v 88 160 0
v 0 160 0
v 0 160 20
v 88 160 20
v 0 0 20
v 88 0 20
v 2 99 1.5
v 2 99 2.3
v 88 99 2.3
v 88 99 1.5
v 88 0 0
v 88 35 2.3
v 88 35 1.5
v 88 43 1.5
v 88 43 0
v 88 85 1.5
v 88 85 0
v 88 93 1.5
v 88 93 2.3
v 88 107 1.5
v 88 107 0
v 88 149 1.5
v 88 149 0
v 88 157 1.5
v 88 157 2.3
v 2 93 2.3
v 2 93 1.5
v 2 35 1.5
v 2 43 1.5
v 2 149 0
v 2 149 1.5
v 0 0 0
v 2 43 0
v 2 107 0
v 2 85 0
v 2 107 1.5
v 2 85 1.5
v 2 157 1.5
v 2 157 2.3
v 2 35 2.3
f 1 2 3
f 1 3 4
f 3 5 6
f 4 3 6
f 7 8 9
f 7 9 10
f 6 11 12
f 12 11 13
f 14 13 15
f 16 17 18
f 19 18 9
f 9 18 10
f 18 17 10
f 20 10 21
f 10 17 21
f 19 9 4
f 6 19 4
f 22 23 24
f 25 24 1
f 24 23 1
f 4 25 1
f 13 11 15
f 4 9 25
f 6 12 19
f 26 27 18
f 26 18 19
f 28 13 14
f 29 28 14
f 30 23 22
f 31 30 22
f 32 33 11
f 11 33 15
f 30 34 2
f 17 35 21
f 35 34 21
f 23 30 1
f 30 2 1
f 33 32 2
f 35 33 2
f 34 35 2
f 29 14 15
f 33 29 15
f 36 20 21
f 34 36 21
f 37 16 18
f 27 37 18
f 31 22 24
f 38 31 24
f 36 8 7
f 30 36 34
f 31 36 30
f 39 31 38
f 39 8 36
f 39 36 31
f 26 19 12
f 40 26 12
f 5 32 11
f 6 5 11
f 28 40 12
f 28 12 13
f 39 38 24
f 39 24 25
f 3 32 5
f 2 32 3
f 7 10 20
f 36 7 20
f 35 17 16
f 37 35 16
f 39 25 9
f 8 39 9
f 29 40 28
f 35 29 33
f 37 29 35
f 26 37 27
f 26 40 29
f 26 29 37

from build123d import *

# Parameters (mm, degrees)
F0_W     = 88
F0_H     = 160
F1_DEPTH = 20
F3_DEPTH = 86


with BuildPart() as f1:
    # F0 (on Top) → F1 (new body)
    with BuildSketch(Plane.XY):
        with Locations((44, 80)):
            Rectangle(F0_W, F0_H)
    extrude(amount=F1_DEPTH)

    # F2 (on face) → F3 (cut)
    with BuildSketch(Plane.YZ.offset(88)):
        Polygon((107, 0), (149, 0), (149, 1.5), (157, 1.5), (157, 2.3), (99, 2.3), (99, 1.5), (107, 1.5), align=None)
        Polygon((93, 1.5), (93, 2.3), (35, 2.3), (35, 1.5), (43, 1.5), (43, 0), (85, 0), (85, 1.5), align=None)
    extrude(amount=-F3_DEPTH, mode=Mode.SUBTRACT)


solid = f1.part
